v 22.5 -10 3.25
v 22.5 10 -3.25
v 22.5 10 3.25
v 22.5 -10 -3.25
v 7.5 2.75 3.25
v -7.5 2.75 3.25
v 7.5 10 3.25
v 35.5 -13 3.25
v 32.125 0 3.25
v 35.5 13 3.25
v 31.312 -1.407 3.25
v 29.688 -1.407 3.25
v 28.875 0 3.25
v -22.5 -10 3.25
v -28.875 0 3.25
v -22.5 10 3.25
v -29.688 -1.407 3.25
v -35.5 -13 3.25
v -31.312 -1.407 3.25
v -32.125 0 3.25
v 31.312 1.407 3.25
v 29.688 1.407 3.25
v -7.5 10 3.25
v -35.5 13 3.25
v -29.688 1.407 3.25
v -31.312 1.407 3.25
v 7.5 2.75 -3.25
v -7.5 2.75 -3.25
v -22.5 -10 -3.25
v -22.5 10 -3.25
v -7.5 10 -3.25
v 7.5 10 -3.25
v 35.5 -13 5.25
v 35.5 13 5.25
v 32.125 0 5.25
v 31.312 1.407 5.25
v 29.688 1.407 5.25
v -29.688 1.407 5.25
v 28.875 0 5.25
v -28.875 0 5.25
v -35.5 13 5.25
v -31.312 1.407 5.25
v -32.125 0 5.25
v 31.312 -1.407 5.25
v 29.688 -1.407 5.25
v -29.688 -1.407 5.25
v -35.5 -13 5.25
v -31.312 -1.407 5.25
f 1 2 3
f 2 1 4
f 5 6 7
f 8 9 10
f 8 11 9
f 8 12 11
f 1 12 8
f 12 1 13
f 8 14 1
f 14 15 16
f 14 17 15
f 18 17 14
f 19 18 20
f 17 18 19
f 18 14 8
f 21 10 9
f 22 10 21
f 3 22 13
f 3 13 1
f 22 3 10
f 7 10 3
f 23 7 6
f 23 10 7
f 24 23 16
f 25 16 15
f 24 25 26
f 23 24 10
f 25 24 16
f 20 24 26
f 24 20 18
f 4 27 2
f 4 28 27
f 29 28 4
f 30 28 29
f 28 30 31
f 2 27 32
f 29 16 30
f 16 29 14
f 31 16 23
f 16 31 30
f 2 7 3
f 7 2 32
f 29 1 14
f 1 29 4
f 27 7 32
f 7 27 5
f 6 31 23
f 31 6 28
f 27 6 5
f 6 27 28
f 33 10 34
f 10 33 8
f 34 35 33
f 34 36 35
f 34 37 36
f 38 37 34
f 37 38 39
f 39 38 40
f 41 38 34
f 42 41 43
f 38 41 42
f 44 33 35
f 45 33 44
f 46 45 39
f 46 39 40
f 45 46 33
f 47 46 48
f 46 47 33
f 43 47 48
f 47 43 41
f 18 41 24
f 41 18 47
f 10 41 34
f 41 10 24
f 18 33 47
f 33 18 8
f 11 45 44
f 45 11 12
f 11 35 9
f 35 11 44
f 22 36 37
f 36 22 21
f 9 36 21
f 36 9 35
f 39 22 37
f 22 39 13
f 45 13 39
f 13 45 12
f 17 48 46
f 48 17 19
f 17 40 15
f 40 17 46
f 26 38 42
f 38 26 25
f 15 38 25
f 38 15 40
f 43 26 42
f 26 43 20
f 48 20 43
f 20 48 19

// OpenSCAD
union(){
difference(){
color("red")
cube([45, 20, 6.5], center = true);
translate([0, 6.5, 0])
cube([15, 7.5, 10], center = true);}


difference(){
color("green")
translate([0, 0, 4.25])
cube([71, 26, 2], center = true);

color("blue")
translate([30.5, 0, 0])
cylinder (h = 15, r = 1.625, center = true);

color("blue")
translate([-30.5, 0, 0])
cylinder (h = 15, r = 1.625, center = true);}
}
